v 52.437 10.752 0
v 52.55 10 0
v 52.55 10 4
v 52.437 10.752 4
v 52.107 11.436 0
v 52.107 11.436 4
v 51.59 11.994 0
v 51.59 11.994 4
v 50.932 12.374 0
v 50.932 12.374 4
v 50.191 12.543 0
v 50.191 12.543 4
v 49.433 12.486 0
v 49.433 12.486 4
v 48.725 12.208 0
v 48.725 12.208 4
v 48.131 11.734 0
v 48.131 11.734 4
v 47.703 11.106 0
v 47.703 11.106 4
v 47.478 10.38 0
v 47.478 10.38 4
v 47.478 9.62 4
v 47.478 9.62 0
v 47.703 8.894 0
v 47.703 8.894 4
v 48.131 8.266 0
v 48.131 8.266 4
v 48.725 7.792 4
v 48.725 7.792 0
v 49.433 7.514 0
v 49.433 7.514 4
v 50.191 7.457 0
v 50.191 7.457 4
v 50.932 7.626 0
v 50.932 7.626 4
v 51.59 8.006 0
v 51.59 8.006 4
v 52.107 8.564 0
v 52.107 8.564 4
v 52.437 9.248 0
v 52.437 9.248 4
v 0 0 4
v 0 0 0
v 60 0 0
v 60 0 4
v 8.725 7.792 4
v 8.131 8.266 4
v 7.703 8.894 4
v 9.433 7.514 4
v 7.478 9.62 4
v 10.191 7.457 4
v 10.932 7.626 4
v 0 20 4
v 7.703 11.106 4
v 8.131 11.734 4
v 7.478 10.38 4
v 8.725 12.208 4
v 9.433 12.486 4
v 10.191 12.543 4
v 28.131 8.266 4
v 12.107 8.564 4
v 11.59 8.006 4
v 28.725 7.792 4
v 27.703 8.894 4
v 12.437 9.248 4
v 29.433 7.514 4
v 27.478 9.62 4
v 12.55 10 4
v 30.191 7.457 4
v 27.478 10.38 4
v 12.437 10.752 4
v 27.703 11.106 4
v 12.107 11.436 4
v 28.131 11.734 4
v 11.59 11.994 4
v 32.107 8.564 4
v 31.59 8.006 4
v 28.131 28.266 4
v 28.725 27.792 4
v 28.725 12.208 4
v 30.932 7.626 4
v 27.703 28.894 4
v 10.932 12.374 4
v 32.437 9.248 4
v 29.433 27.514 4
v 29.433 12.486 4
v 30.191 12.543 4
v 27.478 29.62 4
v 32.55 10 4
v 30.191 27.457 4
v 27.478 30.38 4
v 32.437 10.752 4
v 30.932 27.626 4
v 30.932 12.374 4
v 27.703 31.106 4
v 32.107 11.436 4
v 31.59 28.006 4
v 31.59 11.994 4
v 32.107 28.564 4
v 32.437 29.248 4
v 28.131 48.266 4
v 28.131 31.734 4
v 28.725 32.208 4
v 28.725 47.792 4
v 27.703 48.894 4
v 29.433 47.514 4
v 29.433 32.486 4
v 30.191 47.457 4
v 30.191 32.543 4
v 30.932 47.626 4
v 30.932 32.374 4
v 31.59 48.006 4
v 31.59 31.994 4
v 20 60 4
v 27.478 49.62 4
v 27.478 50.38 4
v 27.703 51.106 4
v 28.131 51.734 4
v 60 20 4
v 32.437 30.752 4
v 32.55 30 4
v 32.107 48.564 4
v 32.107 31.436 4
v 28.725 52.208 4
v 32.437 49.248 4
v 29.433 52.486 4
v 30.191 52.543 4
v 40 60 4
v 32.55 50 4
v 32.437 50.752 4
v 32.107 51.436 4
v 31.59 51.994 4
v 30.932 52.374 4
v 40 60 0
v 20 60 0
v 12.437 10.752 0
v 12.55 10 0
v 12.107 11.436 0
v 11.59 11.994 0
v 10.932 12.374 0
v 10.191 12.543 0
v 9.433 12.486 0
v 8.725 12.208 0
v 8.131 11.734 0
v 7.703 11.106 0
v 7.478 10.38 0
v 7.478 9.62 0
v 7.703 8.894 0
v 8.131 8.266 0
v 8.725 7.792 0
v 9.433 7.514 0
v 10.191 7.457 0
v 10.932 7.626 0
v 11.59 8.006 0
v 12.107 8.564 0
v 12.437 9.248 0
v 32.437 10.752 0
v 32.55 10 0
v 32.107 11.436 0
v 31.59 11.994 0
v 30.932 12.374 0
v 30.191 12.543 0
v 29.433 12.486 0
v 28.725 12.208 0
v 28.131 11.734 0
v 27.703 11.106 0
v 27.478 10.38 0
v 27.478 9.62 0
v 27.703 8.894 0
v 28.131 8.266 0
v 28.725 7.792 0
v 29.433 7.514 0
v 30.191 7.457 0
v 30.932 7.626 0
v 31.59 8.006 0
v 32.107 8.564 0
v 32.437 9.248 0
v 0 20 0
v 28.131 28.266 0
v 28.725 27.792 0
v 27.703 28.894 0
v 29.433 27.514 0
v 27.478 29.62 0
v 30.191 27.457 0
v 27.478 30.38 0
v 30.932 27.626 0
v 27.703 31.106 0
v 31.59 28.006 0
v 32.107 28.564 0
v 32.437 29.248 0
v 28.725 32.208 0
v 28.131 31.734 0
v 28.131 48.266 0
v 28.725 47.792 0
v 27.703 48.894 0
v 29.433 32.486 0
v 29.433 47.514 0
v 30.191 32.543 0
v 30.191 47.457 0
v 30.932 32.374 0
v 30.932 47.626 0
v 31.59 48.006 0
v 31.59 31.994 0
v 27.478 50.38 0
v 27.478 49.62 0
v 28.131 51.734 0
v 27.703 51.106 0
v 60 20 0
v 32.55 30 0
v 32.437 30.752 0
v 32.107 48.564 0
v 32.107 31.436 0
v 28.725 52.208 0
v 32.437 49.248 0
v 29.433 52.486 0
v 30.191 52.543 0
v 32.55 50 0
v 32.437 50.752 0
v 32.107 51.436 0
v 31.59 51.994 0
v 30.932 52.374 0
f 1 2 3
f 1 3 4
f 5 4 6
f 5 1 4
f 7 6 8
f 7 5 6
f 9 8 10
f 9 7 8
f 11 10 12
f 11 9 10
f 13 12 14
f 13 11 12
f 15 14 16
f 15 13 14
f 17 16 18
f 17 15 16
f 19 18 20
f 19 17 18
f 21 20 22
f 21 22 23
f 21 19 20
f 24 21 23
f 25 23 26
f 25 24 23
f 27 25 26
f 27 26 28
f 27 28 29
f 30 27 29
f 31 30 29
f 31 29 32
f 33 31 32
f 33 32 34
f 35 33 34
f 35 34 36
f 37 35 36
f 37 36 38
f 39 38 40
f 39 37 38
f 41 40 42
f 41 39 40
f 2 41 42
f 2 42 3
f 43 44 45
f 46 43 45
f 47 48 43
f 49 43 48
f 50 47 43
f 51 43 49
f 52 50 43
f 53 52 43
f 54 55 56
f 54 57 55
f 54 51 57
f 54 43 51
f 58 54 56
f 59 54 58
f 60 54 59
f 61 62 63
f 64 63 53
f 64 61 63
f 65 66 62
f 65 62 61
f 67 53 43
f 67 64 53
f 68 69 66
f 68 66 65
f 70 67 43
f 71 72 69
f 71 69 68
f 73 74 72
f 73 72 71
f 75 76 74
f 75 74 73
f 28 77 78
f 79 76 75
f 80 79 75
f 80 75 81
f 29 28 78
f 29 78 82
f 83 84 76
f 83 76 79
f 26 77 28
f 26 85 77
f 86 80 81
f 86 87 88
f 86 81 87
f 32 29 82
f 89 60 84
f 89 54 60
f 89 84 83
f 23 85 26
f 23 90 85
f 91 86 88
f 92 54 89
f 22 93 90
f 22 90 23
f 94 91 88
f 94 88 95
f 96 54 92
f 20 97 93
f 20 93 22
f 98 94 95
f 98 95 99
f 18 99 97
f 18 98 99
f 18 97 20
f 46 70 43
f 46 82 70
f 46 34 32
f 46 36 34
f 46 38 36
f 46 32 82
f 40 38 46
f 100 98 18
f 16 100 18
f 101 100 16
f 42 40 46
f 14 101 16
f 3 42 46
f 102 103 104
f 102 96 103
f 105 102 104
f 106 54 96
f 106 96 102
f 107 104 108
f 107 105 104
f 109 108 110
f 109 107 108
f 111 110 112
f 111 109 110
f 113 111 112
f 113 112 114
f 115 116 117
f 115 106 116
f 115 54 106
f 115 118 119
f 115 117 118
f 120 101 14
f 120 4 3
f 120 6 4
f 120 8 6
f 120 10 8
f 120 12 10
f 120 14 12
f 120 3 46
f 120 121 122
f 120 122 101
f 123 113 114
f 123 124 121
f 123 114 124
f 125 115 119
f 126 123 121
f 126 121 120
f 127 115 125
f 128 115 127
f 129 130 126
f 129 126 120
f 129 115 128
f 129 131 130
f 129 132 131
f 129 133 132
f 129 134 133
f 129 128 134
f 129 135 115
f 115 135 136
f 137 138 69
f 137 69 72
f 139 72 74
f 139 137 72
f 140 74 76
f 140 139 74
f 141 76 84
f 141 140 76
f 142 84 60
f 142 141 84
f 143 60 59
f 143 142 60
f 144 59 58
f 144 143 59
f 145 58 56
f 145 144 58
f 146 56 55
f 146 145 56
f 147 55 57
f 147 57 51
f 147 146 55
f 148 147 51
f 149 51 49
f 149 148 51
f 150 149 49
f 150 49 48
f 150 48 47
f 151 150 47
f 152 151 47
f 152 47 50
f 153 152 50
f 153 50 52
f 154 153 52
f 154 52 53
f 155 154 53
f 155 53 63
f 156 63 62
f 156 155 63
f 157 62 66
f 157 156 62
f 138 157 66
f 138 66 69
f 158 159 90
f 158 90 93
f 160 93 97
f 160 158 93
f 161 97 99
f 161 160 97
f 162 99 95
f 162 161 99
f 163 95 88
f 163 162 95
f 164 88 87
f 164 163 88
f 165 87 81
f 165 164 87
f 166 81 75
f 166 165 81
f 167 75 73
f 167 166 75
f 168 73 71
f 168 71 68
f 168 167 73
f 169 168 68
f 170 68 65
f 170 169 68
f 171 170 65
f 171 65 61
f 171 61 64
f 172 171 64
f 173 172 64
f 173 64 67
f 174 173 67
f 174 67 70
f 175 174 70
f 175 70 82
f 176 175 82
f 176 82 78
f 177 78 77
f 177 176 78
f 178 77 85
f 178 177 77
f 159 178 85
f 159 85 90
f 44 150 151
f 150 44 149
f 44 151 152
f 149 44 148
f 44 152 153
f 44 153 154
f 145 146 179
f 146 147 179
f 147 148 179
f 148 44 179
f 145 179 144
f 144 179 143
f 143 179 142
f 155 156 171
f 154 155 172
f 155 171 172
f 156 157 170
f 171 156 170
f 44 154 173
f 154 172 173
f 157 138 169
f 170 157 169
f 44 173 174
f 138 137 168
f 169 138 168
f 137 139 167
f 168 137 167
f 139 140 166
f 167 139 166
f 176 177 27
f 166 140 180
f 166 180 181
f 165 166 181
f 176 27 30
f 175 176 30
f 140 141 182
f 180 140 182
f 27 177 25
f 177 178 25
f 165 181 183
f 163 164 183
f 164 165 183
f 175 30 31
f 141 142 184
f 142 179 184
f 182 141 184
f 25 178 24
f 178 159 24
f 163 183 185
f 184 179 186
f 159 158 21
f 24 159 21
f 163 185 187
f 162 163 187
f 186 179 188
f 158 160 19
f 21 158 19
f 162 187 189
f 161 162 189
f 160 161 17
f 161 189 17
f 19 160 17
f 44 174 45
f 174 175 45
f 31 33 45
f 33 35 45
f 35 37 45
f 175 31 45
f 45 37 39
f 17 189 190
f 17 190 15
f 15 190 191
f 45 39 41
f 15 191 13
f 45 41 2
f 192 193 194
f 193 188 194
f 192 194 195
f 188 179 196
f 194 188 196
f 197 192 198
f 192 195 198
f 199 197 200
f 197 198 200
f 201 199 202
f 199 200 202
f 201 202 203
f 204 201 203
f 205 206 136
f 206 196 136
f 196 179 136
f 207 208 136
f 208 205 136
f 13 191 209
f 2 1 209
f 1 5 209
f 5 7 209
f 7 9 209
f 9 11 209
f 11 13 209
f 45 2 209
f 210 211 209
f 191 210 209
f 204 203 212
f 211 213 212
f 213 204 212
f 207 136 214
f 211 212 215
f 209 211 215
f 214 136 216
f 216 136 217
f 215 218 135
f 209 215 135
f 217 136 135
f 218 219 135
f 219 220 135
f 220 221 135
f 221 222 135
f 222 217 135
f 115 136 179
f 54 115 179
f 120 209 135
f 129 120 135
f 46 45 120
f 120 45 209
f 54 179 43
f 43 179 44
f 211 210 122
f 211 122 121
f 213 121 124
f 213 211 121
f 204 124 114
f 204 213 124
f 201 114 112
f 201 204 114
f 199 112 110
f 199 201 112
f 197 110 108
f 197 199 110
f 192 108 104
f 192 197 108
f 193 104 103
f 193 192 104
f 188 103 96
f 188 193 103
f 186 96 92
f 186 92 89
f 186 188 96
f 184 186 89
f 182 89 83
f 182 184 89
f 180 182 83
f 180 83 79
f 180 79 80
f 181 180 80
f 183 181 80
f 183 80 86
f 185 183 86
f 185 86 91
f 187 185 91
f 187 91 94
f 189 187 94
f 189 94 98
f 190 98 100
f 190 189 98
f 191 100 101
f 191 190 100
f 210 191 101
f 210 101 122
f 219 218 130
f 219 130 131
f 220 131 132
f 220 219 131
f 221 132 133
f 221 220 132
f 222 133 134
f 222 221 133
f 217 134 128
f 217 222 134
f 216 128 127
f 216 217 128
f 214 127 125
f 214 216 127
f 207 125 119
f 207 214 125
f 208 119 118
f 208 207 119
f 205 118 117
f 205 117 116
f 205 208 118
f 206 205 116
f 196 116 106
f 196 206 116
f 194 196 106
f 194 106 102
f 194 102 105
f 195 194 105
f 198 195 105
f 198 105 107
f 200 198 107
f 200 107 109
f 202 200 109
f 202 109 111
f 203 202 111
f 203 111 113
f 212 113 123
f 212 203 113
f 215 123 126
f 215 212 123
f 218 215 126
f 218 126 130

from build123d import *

# Parameters (mm, degrees)
SKETCH_R  = 2.55
PAD_DEPTH = 4


with BuildPart() as part:
    # Sketch → Pad (new body)
    with BuildSketch(Plane.XY):
        Polygon((0, 0), (60, 0), (60, 20), (40, 60), (20, 60), (0, 20), align=None)
        with Locations((30, 10)):
            Circle(SKETCH_R, mode=Mode.SUBTRACT)
        with Locations((10, 10)):
            Circle(SKETCH_R, mode=Mode.SUBTRACT)
        with Locations((50, 10)):
            Circle(SKETCH_R, mode=Mode.SUBTRACT)
        with Locations((30, 30)):
            Circle(SKETCH_R, mode=Mode.SUBTRACT)
        with Locations((30, 50)):
            Circle(SKETCH_R, mode=Mode.SUBTRACT)
    extrude(amount=PAD_DEPTH)


solid = part.part
